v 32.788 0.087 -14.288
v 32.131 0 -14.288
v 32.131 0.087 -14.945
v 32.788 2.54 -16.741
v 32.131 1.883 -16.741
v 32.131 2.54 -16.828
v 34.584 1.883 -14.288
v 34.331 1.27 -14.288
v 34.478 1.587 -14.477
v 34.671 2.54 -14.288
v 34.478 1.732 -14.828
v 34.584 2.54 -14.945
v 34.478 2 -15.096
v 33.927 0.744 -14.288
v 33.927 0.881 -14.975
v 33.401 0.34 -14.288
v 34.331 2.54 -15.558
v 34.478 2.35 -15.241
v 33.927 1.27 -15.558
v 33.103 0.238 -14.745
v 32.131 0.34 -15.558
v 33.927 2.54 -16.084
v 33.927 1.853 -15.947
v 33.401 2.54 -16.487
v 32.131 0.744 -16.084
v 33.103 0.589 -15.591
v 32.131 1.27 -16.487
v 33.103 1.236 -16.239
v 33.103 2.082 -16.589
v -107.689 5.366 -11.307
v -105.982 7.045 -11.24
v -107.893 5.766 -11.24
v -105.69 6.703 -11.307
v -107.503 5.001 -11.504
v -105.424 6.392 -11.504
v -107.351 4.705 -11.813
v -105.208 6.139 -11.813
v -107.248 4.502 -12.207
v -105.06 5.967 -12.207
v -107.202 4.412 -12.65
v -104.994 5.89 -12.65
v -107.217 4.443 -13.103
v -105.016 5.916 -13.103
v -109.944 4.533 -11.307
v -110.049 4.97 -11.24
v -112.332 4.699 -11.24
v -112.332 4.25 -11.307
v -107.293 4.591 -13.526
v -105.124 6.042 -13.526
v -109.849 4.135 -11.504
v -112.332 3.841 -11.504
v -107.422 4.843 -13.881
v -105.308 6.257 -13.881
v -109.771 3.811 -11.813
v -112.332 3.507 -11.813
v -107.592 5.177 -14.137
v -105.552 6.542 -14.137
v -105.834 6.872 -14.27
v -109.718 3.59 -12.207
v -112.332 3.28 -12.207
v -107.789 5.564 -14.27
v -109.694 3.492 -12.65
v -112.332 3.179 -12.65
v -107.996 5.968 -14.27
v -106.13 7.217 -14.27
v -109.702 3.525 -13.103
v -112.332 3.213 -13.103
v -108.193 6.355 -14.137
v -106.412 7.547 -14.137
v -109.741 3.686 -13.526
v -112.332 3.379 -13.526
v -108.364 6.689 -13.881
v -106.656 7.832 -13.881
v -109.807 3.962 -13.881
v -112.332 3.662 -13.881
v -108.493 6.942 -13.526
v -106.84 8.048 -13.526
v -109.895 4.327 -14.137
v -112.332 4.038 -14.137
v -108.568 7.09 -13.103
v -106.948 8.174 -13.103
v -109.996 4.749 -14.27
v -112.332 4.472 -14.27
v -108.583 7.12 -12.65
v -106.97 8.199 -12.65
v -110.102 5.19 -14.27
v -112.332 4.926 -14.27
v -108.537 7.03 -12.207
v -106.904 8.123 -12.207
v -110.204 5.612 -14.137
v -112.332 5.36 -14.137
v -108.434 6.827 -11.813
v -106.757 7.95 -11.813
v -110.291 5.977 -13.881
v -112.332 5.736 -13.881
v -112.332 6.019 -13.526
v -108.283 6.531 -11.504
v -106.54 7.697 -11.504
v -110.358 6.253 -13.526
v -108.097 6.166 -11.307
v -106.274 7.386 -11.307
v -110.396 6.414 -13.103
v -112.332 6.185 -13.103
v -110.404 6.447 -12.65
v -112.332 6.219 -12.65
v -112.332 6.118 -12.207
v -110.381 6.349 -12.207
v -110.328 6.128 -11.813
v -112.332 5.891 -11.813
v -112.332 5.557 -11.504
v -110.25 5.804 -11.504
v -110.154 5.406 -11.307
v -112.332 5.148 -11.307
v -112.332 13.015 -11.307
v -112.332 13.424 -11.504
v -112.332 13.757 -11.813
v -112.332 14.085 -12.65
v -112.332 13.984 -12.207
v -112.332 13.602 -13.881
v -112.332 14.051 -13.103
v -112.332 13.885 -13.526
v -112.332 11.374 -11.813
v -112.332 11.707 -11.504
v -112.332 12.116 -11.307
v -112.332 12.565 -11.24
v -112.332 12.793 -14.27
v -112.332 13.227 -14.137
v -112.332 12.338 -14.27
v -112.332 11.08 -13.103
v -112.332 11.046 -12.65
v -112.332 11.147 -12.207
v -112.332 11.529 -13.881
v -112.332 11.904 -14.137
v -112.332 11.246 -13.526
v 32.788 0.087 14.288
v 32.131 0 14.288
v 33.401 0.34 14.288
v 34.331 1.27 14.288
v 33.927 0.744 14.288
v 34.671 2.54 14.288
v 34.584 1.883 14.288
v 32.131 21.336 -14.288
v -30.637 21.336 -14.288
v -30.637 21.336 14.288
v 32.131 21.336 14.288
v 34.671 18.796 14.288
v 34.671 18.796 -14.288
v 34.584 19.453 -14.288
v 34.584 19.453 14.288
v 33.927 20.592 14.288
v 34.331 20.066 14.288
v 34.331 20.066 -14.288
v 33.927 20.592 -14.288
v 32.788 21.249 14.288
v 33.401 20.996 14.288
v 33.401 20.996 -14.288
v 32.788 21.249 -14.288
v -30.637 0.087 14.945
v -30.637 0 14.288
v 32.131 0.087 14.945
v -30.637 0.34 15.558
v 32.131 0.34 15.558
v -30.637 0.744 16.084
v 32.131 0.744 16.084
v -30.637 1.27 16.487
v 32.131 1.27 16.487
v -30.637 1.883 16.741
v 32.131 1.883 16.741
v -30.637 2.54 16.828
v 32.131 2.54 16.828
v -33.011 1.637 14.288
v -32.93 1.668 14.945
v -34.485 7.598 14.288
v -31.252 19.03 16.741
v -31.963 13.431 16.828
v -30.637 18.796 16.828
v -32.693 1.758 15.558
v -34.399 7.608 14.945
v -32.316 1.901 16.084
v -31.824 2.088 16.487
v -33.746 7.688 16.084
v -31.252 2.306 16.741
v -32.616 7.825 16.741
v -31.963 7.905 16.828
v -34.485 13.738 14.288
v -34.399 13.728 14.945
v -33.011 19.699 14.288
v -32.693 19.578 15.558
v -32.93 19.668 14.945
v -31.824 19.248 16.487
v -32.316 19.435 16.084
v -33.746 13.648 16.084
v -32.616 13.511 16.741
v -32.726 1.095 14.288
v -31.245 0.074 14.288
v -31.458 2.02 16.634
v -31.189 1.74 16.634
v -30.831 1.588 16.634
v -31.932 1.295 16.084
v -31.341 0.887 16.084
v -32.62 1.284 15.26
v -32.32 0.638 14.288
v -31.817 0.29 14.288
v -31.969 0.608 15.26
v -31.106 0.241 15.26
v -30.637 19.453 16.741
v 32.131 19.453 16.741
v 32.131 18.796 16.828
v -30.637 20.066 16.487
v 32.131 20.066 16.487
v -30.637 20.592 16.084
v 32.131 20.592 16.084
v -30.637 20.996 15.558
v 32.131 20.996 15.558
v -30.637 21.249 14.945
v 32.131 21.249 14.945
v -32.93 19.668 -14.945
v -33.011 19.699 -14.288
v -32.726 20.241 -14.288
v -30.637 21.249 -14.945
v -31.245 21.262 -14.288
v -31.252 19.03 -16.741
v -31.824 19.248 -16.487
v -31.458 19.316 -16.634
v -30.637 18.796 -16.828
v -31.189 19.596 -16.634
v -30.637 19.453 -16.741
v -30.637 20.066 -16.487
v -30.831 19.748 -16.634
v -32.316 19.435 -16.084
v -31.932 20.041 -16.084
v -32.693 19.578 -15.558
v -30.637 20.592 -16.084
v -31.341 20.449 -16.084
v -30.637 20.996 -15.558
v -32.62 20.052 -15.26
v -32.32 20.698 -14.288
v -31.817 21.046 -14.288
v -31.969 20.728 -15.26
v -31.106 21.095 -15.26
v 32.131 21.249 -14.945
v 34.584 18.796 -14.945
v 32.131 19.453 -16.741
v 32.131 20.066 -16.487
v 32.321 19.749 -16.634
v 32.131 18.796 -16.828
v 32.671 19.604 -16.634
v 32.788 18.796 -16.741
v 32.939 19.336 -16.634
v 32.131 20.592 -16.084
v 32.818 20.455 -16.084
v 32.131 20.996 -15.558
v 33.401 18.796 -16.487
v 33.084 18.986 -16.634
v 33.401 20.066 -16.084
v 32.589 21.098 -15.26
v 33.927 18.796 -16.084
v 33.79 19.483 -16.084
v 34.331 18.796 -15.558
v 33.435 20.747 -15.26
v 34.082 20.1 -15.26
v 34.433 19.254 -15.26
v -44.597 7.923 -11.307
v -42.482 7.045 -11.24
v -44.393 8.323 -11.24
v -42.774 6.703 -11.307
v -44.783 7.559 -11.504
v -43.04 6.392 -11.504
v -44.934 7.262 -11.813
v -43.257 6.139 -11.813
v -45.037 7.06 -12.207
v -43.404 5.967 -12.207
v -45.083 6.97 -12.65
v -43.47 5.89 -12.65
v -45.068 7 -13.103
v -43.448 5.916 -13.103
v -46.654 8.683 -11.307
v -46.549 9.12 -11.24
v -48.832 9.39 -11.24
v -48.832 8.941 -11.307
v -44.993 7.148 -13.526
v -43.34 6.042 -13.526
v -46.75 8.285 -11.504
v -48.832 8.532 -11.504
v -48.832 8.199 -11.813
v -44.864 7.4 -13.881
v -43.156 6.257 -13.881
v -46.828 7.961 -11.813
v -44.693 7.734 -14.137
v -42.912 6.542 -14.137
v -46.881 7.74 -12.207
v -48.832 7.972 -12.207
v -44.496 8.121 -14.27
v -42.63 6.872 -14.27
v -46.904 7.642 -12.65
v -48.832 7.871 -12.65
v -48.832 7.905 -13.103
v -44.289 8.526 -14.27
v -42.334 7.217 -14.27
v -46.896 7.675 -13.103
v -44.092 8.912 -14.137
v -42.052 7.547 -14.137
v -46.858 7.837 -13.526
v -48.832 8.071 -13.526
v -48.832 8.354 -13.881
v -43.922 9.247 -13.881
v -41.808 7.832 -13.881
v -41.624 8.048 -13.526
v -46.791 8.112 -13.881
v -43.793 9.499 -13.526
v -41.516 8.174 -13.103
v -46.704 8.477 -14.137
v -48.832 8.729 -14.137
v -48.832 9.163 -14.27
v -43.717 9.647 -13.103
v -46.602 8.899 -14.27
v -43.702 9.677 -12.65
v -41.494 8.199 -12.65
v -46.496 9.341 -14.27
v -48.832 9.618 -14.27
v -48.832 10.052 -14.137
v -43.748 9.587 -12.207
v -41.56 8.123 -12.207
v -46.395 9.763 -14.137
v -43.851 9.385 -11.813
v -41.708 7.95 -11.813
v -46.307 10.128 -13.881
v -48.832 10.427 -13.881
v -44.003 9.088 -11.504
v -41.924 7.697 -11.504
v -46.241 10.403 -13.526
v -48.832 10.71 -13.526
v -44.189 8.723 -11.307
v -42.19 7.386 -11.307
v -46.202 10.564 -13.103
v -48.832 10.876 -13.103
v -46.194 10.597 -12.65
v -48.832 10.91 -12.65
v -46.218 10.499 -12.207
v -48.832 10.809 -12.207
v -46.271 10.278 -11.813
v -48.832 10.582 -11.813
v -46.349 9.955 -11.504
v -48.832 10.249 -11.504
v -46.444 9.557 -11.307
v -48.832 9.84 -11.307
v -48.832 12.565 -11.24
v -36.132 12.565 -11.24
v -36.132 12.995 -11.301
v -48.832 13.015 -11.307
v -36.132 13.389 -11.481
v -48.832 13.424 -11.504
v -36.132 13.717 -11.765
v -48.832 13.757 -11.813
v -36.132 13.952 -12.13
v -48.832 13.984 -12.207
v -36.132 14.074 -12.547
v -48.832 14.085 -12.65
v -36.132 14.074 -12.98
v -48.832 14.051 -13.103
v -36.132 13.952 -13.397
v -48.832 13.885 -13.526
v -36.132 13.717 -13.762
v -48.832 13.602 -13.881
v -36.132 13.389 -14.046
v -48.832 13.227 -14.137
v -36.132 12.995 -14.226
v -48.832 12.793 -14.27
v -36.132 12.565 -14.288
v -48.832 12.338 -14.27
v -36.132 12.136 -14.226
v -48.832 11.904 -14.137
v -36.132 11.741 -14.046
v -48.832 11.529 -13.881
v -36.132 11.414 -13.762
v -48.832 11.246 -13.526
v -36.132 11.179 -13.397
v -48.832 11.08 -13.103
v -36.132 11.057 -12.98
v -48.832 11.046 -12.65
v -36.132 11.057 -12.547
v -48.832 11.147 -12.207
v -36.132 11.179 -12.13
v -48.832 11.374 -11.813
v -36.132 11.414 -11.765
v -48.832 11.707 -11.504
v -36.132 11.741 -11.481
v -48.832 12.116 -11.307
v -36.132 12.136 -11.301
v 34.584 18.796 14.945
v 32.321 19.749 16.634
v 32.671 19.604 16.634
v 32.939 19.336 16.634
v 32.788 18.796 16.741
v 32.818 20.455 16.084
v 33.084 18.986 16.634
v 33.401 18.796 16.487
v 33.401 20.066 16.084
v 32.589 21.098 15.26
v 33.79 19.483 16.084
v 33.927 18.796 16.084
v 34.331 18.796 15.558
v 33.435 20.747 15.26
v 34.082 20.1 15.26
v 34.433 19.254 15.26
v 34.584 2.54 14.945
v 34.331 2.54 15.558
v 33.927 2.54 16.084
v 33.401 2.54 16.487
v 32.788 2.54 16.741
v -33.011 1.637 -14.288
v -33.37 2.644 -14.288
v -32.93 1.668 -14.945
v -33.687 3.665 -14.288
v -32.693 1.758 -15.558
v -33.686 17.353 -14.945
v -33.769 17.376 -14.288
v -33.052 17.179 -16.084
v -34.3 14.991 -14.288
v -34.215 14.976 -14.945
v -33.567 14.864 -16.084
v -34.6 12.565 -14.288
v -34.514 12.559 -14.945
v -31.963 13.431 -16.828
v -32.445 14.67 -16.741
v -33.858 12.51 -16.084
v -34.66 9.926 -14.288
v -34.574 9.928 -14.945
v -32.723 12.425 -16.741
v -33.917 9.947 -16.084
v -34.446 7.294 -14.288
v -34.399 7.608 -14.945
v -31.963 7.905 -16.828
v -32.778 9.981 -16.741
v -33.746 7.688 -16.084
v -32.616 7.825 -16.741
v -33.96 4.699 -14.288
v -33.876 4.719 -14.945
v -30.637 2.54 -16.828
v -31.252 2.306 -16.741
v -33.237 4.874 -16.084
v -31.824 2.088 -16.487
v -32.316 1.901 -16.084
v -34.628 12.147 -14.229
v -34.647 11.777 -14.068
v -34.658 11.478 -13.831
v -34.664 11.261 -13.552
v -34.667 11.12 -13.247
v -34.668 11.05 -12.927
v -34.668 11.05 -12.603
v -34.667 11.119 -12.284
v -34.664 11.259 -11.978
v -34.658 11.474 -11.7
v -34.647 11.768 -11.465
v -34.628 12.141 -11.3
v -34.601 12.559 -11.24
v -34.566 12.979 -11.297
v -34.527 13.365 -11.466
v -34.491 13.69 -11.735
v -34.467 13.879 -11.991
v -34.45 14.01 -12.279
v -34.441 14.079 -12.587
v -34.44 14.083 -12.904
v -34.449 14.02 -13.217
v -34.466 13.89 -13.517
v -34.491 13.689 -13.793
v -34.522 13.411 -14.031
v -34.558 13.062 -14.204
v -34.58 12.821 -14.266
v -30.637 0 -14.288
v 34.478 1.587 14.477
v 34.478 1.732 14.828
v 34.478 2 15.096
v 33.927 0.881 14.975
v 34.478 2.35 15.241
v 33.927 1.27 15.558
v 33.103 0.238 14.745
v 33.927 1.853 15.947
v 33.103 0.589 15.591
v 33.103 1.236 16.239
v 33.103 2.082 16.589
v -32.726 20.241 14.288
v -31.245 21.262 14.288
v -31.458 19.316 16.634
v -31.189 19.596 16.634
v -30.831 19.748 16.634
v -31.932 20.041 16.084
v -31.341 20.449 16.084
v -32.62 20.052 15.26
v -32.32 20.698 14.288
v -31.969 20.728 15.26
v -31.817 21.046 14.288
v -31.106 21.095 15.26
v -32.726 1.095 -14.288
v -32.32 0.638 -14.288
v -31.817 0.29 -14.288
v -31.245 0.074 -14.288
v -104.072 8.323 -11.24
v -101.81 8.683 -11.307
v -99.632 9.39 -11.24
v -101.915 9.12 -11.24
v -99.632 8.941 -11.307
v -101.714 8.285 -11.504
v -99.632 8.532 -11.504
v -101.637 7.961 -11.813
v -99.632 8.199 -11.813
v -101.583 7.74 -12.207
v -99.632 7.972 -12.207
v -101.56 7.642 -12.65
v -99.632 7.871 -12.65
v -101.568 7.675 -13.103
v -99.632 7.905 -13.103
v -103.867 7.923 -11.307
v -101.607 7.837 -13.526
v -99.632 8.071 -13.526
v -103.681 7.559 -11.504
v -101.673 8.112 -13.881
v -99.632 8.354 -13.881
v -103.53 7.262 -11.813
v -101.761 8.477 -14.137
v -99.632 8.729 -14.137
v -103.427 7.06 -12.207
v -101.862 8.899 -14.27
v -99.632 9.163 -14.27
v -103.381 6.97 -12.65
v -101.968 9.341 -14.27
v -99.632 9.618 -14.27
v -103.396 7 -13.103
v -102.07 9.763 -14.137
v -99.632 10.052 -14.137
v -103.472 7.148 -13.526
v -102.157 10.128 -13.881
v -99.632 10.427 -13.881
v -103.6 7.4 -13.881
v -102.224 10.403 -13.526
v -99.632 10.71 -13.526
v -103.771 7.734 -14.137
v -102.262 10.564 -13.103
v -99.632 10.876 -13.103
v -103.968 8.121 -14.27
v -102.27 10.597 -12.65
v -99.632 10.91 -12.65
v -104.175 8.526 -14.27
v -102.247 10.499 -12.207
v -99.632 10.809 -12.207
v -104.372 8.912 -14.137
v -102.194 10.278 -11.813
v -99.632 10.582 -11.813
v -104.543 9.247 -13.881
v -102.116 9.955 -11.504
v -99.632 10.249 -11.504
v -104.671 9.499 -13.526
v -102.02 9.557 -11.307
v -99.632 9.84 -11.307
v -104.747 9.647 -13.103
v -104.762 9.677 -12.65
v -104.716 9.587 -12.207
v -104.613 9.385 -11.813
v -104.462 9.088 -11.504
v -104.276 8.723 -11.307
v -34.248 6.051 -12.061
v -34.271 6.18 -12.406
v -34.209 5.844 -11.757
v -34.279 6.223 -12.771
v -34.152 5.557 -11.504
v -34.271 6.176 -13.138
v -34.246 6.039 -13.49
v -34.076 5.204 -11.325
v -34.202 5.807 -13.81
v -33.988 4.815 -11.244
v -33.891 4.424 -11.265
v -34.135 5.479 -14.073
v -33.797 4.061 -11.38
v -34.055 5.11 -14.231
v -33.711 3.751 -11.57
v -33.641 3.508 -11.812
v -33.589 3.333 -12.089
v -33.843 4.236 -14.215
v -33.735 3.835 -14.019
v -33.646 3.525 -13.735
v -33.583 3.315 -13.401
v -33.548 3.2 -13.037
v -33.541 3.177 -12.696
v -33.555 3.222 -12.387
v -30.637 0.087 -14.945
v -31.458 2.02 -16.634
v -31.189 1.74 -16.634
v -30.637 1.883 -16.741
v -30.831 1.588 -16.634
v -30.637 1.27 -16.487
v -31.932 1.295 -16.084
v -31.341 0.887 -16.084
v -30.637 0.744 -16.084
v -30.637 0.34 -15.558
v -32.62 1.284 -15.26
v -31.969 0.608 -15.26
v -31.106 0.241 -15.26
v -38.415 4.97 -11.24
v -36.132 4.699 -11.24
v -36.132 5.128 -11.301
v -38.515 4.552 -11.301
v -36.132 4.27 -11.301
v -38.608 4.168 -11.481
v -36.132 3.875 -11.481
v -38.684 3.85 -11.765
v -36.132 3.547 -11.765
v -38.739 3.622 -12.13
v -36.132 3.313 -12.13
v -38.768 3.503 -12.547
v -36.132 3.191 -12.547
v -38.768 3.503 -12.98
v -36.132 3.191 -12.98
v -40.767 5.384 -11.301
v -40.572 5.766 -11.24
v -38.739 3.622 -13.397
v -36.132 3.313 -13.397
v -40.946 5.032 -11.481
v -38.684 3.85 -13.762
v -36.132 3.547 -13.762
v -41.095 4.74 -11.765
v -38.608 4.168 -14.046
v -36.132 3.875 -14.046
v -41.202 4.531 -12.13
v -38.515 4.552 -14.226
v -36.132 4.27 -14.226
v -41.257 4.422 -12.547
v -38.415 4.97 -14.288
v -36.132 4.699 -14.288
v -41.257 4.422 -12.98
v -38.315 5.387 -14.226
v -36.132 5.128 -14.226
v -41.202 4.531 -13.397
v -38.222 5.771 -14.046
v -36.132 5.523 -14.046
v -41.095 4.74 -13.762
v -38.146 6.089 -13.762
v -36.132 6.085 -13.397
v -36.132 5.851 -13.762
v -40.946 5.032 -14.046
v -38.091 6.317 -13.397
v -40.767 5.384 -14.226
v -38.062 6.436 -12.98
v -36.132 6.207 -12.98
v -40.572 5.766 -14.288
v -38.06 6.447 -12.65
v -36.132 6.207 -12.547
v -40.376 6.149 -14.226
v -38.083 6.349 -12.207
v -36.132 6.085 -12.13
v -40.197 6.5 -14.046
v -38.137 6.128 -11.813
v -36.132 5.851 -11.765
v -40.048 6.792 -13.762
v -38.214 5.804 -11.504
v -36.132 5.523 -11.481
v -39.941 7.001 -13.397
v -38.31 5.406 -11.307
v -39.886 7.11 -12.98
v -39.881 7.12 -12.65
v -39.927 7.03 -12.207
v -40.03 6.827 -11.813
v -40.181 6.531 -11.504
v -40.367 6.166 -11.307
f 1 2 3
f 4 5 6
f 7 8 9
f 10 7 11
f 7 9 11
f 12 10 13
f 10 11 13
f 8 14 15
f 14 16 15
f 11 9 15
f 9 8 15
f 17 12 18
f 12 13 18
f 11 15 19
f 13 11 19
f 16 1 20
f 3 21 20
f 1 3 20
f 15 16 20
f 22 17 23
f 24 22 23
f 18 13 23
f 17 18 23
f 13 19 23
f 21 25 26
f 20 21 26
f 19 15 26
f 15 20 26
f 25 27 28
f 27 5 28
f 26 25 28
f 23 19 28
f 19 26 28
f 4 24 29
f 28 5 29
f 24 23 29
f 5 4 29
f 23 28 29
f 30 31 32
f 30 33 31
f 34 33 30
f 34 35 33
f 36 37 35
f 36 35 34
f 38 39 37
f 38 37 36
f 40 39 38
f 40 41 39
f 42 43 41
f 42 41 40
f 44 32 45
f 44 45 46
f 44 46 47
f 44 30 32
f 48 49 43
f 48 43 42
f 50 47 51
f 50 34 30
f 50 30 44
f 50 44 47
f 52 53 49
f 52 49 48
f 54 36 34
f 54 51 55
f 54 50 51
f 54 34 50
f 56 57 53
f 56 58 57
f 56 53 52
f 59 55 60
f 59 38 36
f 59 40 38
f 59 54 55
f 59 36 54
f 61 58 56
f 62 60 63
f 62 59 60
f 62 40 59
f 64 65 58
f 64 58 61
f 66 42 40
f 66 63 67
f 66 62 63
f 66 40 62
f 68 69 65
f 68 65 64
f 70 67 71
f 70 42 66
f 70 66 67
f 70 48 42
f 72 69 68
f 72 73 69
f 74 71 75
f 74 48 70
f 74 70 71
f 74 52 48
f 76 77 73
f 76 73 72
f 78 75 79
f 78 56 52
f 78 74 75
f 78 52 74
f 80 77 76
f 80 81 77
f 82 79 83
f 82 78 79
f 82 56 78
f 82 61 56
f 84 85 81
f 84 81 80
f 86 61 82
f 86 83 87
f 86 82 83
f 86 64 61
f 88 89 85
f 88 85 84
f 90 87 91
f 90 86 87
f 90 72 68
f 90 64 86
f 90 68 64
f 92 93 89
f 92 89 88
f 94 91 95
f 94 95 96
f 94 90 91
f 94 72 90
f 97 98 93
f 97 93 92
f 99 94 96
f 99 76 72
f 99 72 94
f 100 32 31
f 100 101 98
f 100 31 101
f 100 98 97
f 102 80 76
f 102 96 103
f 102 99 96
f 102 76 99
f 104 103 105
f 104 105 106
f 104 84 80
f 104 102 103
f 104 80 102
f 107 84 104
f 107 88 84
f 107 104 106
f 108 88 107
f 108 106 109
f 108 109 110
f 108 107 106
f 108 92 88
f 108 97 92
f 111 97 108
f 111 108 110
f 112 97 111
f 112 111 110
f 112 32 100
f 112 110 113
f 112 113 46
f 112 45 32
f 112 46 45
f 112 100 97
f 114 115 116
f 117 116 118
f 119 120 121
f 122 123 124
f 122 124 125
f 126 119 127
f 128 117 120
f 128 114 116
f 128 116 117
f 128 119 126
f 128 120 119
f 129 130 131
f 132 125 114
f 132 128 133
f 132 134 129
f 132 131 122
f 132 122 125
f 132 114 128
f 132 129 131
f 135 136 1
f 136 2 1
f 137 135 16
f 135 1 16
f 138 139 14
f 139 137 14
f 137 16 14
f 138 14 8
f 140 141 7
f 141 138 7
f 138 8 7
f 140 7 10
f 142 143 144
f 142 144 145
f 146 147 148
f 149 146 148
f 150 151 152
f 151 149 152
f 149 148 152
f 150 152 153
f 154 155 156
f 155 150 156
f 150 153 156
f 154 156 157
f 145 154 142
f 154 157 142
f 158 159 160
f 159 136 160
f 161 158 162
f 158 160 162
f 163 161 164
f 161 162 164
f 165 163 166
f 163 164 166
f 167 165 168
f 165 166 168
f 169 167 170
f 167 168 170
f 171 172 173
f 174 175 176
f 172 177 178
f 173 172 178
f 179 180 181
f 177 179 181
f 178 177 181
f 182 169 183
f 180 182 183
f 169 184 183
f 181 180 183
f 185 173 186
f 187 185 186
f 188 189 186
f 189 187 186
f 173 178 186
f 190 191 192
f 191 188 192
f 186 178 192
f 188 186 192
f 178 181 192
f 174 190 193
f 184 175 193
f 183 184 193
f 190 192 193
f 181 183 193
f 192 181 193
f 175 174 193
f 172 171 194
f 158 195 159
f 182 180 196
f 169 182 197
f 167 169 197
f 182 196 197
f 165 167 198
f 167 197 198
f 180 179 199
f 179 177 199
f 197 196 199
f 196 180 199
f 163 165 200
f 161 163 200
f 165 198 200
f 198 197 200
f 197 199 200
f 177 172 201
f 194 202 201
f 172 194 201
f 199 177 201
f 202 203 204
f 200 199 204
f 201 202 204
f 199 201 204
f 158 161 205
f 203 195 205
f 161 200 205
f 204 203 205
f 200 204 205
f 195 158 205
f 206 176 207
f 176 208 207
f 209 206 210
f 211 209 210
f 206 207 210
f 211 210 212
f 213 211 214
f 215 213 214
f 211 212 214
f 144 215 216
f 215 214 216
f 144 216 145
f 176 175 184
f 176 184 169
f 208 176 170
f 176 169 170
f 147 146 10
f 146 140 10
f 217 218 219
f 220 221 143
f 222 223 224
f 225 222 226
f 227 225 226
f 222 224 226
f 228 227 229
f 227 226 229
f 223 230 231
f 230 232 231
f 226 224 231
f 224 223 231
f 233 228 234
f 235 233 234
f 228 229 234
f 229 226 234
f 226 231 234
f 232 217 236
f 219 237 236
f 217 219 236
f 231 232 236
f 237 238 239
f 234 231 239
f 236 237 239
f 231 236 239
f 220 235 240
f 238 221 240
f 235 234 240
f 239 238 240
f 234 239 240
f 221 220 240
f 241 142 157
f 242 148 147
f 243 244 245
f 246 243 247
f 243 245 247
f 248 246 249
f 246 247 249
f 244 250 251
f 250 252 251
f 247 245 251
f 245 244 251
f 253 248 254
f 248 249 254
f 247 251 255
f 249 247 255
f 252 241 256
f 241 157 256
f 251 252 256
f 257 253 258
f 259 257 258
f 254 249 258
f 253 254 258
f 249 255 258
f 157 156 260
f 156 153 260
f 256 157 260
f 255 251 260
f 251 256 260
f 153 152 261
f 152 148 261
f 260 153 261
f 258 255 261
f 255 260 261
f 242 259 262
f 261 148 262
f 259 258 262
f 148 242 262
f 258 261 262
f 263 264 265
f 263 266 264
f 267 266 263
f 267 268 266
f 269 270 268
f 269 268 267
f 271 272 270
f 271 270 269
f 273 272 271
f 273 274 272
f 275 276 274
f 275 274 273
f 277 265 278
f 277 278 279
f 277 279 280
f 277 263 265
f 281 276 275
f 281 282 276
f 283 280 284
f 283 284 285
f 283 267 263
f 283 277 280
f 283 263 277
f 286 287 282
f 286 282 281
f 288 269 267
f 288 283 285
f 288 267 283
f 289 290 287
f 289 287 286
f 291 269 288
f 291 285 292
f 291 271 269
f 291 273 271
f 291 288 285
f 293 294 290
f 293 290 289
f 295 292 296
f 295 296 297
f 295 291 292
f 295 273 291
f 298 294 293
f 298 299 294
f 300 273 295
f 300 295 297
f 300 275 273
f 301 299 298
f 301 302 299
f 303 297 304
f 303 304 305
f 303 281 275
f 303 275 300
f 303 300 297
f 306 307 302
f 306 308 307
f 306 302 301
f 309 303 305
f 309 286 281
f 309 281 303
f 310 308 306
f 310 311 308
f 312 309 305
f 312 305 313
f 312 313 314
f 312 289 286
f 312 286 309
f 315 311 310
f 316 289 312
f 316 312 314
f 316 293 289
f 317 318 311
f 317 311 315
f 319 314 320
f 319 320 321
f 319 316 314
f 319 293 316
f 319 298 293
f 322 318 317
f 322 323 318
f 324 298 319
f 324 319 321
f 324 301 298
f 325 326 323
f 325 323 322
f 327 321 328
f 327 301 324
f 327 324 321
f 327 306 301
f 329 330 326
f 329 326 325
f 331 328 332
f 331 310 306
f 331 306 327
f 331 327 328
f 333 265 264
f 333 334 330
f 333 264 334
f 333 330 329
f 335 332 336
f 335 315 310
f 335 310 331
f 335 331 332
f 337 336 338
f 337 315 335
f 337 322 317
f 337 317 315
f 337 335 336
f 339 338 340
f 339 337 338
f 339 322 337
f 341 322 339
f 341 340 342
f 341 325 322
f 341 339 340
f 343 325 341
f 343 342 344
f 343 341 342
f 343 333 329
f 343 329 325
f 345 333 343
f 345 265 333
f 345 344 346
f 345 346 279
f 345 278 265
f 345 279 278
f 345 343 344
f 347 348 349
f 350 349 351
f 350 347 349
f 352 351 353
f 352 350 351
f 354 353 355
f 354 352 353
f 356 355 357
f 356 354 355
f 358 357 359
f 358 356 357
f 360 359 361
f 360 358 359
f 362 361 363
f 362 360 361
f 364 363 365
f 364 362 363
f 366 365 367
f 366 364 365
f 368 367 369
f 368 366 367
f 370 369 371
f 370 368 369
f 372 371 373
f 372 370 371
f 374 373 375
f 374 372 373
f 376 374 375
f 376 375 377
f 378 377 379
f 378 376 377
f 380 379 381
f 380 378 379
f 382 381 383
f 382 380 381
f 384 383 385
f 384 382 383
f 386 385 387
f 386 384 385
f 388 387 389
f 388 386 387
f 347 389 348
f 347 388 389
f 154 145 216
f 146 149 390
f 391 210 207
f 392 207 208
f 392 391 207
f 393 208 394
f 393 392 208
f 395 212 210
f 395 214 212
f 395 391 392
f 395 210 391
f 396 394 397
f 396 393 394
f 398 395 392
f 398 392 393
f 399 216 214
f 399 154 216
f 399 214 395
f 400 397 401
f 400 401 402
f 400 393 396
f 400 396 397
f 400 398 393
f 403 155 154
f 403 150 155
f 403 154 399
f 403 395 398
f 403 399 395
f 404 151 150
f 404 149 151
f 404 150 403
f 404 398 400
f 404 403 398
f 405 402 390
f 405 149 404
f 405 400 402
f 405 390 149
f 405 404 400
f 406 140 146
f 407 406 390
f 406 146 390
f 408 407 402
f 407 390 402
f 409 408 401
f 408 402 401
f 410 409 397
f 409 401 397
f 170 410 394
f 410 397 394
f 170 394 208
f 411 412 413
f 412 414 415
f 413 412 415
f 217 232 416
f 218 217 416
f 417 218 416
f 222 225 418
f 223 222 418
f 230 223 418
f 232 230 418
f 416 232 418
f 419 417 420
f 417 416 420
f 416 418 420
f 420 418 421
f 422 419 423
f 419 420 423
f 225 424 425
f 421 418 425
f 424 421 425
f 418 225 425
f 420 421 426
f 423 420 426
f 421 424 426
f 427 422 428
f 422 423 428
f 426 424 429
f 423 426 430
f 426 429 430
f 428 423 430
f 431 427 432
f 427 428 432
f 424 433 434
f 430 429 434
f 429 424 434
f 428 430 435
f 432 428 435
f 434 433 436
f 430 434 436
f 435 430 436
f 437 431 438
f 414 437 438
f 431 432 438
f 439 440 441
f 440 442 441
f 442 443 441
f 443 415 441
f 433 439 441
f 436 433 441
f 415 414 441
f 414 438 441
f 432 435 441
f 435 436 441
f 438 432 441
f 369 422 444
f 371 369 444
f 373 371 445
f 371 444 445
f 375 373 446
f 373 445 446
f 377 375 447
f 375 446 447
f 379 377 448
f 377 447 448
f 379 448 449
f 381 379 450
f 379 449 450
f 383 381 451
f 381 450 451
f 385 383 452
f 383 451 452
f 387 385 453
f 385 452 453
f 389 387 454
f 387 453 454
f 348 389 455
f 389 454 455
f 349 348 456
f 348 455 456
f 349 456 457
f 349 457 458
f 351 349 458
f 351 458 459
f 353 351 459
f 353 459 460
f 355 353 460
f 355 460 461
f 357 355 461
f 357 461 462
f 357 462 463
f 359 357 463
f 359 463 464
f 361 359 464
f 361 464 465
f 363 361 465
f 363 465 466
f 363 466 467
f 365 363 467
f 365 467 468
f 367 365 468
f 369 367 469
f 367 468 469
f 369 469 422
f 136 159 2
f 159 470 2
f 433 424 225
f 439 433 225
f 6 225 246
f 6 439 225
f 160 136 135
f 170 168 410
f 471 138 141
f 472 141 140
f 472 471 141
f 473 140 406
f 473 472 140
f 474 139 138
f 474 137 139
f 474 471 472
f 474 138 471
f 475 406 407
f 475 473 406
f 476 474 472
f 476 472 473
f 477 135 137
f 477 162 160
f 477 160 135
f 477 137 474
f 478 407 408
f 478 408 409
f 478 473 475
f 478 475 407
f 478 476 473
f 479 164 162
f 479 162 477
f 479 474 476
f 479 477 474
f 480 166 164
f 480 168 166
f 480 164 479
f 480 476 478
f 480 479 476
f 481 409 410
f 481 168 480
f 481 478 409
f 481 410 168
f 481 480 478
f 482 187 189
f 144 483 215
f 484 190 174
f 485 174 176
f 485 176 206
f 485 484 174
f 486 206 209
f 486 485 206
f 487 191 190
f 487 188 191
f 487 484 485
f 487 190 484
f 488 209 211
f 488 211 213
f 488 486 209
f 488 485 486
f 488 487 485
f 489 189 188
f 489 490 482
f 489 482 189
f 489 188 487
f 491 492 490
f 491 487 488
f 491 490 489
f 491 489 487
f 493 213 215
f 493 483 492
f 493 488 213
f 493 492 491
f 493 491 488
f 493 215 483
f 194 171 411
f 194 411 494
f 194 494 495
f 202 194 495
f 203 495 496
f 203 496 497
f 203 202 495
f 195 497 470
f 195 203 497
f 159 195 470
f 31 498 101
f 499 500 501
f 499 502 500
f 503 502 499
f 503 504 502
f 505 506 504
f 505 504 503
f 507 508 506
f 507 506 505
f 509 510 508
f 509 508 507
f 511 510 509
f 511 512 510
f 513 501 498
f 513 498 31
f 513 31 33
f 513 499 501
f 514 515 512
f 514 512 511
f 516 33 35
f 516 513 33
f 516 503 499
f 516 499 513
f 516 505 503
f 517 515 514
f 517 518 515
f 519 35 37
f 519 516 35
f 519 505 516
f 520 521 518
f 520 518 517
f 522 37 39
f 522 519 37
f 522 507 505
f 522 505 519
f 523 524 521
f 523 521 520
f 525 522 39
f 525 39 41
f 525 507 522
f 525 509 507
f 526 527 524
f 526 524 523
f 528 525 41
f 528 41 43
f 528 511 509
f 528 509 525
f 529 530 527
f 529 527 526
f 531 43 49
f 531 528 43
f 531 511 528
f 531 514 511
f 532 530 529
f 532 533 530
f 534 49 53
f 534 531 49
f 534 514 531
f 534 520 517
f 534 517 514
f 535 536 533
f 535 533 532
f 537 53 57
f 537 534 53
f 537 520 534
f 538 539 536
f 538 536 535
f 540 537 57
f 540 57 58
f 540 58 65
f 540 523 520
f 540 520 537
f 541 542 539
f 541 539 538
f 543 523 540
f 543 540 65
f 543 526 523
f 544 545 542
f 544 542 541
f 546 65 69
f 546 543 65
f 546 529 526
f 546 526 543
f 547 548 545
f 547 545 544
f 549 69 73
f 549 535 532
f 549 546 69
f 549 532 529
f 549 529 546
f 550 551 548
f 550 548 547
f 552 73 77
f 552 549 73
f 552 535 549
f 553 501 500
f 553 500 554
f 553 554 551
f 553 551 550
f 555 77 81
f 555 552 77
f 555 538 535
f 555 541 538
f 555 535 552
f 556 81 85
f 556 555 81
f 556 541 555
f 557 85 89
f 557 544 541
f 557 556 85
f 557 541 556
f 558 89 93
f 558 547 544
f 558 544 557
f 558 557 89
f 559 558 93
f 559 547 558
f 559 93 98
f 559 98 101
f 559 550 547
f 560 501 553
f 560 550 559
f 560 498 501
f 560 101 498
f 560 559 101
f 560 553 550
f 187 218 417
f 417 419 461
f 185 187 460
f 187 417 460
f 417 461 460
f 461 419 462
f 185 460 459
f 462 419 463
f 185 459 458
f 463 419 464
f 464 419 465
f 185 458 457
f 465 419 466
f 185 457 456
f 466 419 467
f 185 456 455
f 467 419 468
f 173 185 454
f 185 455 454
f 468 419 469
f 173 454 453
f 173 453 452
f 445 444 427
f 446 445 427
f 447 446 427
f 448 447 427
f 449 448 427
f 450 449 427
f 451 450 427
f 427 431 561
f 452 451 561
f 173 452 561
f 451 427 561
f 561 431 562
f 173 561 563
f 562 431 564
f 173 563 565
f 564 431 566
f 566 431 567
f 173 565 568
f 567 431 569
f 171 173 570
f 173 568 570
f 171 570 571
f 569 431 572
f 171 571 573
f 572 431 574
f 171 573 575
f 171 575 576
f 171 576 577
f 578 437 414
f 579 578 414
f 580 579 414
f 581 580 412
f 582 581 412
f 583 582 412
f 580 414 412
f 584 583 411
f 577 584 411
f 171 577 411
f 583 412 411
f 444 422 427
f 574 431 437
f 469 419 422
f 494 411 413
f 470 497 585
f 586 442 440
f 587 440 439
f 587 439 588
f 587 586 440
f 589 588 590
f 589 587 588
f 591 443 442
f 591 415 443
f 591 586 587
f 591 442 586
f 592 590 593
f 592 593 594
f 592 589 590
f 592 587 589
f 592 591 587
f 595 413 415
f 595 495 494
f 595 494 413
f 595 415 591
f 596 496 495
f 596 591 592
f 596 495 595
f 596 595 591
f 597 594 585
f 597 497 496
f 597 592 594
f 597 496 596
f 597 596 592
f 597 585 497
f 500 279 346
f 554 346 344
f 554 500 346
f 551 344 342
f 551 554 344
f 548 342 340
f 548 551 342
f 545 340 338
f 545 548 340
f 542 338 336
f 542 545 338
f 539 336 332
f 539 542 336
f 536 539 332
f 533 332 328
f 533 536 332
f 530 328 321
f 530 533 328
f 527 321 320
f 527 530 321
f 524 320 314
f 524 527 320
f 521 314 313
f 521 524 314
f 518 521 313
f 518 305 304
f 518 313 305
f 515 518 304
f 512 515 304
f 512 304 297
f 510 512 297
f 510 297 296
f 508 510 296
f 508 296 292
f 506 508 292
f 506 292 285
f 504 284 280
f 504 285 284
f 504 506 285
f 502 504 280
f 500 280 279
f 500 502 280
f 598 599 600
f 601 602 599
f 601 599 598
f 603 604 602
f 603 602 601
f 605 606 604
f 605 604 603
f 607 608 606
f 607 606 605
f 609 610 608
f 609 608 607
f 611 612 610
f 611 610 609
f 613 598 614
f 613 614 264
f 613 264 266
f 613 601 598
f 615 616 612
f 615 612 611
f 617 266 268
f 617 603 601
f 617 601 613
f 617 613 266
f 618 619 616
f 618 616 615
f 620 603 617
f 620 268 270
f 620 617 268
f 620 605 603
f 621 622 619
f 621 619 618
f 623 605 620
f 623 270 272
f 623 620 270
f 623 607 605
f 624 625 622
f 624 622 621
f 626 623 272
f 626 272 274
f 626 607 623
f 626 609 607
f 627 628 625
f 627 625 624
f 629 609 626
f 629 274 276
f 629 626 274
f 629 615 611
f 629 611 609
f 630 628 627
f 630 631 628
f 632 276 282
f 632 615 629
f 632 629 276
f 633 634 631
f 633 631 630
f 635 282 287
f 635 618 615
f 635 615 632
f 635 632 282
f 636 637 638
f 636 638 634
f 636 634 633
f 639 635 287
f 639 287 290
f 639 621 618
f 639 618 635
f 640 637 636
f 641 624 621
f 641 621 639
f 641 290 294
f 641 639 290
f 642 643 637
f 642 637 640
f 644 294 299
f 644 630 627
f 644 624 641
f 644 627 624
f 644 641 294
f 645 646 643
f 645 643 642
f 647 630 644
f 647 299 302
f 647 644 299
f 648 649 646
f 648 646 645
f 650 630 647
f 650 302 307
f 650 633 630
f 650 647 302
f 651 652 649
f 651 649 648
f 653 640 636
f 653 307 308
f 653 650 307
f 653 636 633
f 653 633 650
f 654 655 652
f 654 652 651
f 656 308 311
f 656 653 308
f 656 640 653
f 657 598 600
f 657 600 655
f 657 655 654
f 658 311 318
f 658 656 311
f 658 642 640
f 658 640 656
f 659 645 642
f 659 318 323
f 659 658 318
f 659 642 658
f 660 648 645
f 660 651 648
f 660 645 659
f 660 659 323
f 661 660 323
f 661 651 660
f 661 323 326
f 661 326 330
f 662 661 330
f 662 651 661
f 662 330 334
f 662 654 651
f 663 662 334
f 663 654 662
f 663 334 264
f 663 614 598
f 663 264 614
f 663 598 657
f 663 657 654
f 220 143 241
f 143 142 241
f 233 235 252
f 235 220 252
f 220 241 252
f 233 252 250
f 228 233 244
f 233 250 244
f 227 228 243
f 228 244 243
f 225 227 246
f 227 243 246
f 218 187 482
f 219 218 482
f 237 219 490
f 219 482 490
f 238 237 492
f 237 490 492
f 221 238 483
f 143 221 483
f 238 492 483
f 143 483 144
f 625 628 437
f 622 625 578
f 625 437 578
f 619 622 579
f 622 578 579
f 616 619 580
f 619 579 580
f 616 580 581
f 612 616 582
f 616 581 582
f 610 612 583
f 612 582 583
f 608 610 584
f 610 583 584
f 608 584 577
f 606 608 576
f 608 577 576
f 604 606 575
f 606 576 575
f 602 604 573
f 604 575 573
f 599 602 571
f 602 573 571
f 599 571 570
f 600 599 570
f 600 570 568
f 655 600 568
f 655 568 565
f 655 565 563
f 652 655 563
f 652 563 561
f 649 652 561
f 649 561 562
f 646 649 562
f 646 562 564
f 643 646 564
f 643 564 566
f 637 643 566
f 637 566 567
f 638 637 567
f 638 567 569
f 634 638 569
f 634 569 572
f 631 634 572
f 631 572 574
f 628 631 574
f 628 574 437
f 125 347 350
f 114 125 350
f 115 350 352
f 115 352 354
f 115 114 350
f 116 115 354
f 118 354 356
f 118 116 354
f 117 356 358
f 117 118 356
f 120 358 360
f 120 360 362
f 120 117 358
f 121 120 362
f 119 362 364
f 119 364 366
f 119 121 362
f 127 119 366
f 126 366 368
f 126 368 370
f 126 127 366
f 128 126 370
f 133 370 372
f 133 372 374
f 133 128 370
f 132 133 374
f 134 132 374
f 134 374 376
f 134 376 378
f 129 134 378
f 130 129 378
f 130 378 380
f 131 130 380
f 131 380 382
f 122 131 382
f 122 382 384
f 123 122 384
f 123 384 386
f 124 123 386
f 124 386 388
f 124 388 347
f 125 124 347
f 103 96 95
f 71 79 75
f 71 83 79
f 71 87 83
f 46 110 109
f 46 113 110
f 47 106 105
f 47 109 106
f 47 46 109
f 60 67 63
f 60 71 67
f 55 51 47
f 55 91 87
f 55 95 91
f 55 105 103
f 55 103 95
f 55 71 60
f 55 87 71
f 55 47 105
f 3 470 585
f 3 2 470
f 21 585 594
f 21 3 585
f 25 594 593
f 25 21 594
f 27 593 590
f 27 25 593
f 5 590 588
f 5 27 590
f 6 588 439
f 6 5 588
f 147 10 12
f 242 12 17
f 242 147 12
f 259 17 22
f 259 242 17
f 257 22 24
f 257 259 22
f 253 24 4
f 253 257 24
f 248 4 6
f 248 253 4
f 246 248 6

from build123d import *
from build123d.topology import SkipClean

# Parameters (mm, degrees)
SKETCH1_W               = 69.342
SKETCH1_H               = 33.655
BOSS_EXTRUDE1_DEPTH     = 21.336
CUT_EXTRUDE2_DEPTH      = 53.820092408
CUT_EXTRUDE2_DEPTH_BACK = 53.820092408
FILLET1_R               = 2.54
SKETCH3_R               = 1.524
BOSS_EXTRUDE2_DEPTH     = 3.81
SKETCH5_R               = 1.524
SKETCH5_3_R             = 1.524


with BuildPart() as part:
    # Sketch1 → Boss-Extrude1 (new body)
    with BuildSketch(Plane(origin=(0, 0, 0), x_dir=(1, 0, 0), z_dir=(0, 1, 0))):
        Rectangle(SKETCH1_W, SKETCH1_H)
    extrude(amount=BOSS_EXTRUDE1_DEPTH)

    # Sketch2 → Cut-Extrude2 (cut, two sides: drawn at the far end of the back side and taken through both)
    with BuildSketch(Plane.XY.offset(16.8275).offset(-CUT_EXTRUDE2_DEPTH_BACK)):
        with BuildLine():
            Line((30.937128183, 158.024775042), (-32.322112251, 21.336))
            ThreePointArc((-32.322112251, 21.336), (-34.671, 10.668), (-32.322112251, 0))
            Line((-32.322112251, 0), (30.937128183, -136.688775042))
            Line((30.937128183, -136.688775042), (-270.297350074, -136.688775042))
            Line((-270.297350074, -136.688775042), (-270.297350074, 158.024775042))
            Line((-270.297350074, 158.024775042), (30.937128183, 158.024775042))
        make_face()
    extrude(amount=CUT_EXTRUDE2_DEPTH + CUT_EXTRUDE2_DEPTH_BACK, mode=Mode.SUBTRACT)

    # Fillet1
    fillet1_edges = [part.edges().sort_by_distance(p)[0] for p in [
        (34.671, 21.336, 0),
        (1.174443875, 21.336, -16.8275),
        (1.174443875, 0, 16.8275),
        (-32.322112251, 0, 0),
        (1.174443875, 21.336, 16.8275),
        (-32.322112251, 21.336, 0),
        (-34.671, 10.668, 16.8275),
        (-34.671, 10.668, -16.8275),
        (1.174443875, 0, -16.8275),
        (34.671, 0, 0),
        (34.671, 10.668, -16.8275),
        (34.671, 10.668, 16.8275),
    ]]
    fillet(fillet1_edges, radius=FILLET1_R)

    # Sketch3 → Boss-Extrude2 (add)
    with BuildSketch(Plane.ZY.offset(32.322112251)):
        with Locations(Location((-12.7635, 12.56538, 0), (0, 0, 180))):
            Circle(SKETCH3_R)
        with Locations(Location((-12.7635, 4.699, 0), (0, 0, 180))):
            Circle(SKETCH3_R)
    extrude(amount=BOSS_EXTRUDE2_DEPTH)

    # Sweep1: sweep along a path in Sketch4
    with SkipClean():  # the faces are left unmerged after this step: merging them gives an invalid solid
        with BuildLine(Plane.XY.offset(-12.7635)) as sweep1_path:
            Line((-36.132112251, 12.56538), (-48.832112251, 12.56538))
            Line((-48.832112251, 12.56538), (-112.332112251, 12.56538))
        # Sketch5 → Sweep1 (sweep)
        with BuildSketch(Plane.ZY.offset(36.132112251)):
            with Locations((-12.7635, 12.56538)):
                Circle(SKETCH5_R)
        sweep(path=sweep1_path.line)

    # Sweep2: sweep along a path in Sketch4<3>
    with SkipClean():  # the faces are left unmerged after this step: merging them gives an invalid solid
        with BuildLine(Plane.XY.offset(-12.7635)) as sweep2_path:
            ThreePointArc((-36.132112251, 4.699), (-39.516811705, 5.304169163), (-42.482112251, 7.04469))
            ThreePointArc((-42.482112251, 7.04469), (-45.447412797, 8.785210837), (-48.832112251, 9.39038))
            Line((-48.832112251, 9.39038), (-99.632112251, 9.39038))
            ThreePointArc((-99.632112251, 9.39038), (-103.016811705, 8.785210837), (-105.982112251, 7.04469))
            ThreePointArc((-105.982112251, 7.04469), (-108.947412797, 5.304169163), (-112.332112251, 4.699))
        # Sketch5<3> → Sweep2 (sweep)
        with BuildSketch(Plane.ZY.offset(36.132112251)):
            with Locations((-12.7635, 4.699)):
                Circle(SKETCH5_3_R)
        sweep(path=sweep2_path.line)


solid = part.part
